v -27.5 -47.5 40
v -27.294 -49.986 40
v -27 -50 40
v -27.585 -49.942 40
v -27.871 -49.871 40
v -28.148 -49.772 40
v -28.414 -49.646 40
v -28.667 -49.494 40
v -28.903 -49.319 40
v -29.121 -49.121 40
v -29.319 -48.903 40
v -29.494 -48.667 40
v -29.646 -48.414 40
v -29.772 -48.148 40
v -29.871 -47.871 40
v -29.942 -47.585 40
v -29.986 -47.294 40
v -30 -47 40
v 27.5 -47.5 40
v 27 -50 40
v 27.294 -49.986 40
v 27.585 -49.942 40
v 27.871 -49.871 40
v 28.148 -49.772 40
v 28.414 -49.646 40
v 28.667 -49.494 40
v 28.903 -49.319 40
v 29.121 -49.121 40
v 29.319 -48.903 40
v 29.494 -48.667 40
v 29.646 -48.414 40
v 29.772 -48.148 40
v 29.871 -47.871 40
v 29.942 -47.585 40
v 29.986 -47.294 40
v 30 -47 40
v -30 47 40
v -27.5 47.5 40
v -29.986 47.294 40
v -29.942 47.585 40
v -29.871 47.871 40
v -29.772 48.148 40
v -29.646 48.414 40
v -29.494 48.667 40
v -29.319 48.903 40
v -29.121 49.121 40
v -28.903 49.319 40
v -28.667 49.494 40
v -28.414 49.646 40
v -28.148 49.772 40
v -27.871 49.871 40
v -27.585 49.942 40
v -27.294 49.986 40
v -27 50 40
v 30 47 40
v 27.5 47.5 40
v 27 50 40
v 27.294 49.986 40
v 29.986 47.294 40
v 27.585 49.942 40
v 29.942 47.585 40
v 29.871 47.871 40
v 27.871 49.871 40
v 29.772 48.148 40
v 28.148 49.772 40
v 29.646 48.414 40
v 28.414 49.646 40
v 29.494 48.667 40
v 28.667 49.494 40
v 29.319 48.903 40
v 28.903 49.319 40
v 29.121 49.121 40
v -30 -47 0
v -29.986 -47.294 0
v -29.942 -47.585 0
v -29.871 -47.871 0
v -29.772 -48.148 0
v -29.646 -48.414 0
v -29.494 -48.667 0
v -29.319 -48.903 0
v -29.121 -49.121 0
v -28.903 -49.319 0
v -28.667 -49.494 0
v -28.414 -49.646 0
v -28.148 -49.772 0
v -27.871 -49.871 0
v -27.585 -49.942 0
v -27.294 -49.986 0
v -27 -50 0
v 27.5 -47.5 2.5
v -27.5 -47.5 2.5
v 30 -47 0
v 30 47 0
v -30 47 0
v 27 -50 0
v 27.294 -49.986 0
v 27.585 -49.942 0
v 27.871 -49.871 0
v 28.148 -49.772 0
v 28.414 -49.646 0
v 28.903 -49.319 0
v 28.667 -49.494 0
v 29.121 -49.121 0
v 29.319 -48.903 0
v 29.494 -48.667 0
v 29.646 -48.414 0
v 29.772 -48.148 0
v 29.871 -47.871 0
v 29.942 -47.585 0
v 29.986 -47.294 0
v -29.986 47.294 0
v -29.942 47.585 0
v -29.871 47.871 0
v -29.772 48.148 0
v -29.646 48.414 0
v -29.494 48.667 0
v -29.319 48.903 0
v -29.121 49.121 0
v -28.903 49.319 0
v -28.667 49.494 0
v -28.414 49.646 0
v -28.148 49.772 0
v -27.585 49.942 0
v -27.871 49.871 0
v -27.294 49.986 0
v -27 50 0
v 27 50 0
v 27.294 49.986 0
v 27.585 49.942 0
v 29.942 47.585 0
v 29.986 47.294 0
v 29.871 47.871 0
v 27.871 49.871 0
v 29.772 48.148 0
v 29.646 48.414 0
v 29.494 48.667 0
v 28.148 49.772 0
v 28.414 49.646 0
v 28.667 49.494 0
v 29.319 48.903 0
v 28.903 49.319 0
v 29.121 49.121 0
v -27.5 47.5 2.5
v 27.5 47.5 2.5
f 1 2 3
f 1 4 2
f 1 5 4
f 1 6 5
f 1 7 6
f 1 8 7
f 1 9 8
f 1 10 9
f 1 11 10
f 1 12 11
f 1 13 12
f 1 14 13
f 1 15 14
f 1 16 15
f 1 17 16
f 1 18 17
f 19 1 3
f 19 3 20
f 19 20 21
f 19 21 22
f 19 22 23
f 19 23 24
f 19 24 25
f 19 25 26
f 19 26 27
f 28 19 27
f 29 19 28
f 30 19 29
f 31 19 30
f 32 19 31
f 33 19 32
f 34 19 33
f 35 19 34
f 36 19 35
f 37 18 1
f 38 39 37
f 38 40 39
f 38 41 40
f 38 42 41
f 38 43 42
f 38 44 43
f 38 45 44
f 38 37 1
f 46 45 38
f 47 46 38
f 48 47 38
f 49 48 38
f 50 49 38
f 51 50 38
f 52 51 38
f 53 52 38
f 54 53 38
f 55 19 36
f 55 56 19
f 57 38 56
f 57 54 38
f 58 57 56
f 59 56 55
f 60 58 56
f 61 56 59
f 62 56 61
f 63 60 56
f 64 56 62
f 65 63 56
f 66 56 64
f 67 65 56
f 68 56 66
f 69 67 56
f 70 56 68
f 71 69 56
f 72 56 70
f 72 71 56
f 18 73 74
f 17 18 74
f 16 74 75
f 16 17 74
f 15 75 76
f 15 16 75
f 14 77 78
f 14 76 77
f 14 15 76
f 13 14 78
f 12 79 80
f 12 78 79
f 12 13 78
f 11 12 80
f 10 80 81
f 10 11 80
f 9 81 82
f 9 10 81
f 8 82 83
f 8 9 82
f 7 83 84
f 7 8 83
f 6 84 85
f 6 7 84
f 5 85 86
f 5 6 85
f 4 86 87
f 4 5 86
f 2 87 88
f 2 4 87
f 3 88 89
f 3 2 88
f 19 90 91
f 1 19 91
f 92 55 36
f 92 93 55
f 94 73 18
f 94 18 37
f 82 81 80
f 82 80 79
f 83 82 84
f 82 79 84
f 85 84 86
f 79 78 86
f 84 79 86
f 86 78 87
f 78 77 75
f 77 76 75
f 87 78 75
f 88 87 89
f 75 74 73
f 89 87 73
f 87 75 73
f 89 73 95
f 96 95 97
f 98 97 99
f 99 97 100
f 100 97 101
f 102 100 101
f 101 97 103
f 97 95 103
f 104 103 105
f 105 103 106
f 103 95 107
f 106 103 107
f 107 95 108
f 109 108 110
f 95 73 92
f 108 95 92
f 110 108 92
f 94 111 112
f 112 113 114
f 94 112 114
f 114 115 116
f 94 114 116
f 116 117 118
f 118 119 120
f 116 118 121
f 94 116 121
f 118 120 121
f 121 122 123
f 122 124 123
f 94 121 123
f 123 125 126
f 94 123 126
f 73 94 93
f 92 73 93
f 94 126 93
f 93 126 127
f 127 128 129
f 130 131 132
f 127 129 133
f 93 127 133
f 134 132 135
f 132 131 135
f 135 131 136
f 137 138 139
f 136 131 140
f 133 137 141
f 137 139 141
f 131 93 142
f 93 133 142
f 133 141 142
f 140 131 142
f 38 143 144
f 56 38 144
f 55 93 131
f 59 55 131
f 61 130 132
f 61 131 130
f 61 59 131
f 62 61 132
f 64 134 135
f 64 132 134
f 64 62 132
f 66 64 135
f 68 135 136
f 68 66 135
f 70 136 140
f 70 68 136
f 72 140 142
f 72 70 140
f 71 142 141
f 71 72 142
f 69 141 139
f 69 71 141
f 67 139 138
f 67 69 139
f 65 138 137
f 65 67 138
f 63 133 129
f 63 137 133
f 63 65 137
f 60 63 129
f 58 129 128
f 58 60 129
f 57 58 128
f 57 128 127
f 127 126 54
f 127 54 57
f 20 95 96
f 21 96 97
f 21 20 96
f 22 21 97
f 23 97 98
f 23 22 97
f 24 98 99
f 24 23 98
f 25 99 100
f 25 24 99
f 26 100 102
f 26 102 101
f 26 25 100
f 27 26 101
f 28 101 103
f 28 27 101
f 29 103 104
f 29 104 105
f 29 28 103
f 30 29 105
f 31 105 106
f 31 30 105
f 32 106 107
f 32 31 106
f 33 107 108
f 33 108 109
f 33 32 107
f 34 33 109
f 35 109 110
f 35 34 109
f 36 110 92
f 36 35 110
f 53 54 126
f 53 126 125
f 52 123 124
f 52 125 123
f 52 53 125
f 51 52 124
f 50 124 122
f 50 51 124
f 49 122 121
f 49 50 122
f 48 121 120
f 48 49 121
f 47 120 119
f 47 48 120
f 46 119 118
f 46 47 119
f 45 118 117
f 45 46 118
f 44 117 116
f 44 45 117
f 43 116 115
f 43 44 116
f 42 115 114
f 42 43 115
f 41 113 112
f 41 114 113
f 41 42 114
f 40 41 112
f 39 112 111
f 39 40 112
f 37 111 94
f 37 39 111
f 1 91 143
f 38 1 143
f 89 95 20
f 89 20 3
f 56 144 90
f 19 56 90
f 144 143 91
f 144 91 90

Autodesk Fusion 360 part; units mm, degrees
sketch "Sketch1" plane through (0, 0, 0) normal (0, 0, 1) x (1, 0, 0)
  line L0 (30, -50) -> (-30, -50)
  line L1 (-30, -50) -> (-30, 50)
  line L2 (-30, 50) -> (30, 50)
  line L3 (30, 50) -> (30, -50)
  line L4 (30, -50) -> (-30, 50) construction
  line L5 (-30, -50) -> (30, 50) construction
  dimension "d1" = 60
  dimension "d2" = 100
extrude "Extrude1" add sketch "Sketch1" along normal blind 40
shell "Shell1" thickness 2.5 removed faces 1 at (10, -16.6667, 40)
fillet "Fillet1" radius 3 4 edges at (30, 50, 20) (-30, 50, 20) (30, -50, 20) (-30, -50, 20)
